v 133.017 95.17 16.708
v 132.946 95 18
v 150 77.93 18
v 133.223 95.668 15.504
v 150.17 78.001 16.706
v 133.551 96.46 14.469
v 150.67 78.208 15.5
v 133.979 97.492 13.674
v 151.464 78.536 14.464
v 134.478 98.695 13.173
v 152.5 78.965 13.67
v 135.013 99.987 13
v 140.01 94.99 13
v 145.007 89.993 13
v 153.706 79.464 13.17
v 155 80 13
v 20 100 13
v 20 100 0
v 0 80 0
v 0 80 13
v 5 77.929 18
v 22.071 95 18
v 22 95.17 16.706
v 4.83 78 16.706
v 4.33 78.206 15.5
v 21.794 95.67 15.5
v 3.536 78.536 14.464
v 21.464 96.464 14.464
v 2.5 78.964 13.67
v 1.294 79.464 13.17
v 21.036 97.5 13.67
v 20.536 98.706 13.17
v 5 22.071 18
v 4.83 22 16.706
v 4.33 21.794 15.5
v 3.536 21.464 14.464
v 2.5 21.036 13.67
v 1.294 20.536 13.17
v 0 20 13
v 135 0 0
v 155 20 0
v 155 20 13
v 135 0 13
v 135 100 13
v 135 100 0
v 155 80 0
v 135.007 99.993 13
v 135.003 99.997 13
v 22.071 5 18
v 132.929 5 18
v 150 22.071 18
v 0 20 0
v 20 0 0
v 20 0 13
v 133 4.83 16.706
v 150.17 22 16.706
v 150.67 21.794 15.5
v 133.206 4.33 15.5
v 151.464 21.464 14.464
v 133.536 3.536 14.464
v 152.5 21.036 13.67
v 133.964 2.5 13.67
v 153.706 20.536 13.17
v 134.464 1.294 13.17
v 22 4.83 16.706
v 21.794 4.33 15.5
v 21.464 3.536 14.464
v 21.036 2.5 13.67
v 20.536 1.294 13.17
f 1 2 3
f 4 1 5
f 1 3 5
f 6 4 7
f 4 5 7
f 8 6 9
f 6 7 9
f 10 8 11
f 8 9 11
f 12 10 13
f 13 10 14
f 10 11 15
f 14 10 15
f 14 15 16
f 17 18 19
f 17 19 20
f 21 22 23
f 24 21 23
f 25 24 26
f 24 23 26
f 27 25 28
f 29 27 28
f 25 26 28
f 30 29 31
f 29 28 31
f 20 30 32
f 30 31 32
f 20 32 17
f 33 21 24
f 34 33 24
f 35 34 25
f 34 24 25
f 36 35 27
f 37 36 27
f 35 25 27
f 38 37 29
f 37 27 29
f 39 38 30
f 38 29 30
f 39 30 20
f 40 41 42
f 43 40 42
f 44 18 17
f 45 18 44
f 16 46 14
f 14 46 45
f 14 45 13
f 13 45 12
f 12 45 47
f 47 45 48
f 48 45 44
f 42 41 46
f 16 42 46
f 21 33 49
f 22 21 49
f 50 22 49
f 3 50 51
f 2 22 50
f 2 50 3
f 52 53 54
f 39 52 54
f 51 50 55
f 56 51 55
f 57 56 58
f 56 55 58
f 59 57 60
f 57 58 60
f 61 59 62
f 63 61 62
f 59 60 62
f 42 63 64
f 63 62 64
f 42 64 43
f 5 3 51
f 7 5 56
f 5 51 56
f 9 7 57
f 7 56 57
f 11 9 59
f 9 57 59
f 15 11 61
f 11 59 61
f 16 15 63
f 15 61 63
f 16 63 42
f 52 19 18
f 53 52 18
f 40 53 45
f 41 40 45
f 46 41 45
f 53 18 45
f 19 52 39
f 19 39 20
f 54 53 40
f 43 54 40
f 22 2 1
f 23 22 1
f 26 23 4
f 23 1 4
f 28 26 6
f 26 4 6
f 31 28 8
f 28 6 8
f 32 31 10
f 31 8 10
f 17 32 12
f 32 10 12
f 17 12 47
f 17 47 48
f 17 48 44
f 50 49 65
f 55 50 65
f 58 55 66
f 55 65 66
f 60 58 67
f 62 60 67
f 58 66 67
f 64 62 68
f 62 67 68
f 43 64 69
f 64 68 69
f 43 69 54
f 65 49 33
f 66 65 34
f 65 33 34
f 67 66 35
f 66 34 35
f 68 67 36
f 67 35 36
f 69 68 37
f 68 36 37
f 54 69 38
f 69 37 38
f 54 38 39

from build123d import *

# Parameters (mm, degrees)
F0_W     = 155
F0_H     = 100
F1_DEPTH = 18
F2_SIZE  = 20
F4_R     = 5


with BuildPart() as f1:
    # F0 (on Top) → F1 (new body)
    with BuildSketch(Plane.XY):
        with Locations((77.5, 50)):
            Rectangle(F0_W, F0_H)
    extrude(amount=F1_DEPTH)

    # F2
    f2_edges = [f1.edges().sort_by_distance(p)[0] for p in [
        (155, 100, 9),
        (155, 0, 9),
        (0, 100, 9),
        (0, 0, 9),
    ]]
    chamfer(f2_edges, length=F2_SIZE)

    # F6: sweep along a path in F5
    with BuildLine(Plane.XY.offset(18)) as f6_path:
        Line((0, 80), (20, 100))
        Line((20, 100), (135.0186169147, 100))
        Line((135.0186169147, 100), (155, 80))
        Line((155, 80), (155, 20))
        Line((155, 20), (135, 0))
        Line((135, 0), (20, 0))
        Line((20, 0), (0, 20))
        Line((0, 20), (0, 25))
        Line((0, 25), (0, 80))
    # F4 (on offset) → F6 (sweep, cut)
    with BuildSketch(Plane.XZ.offset(-25)):
        with Locations((0, 18)):
            Circle(F4_R)
    sweep(path=f6_path.line, transition=Transition.RIGHT, mode=Mode.SUBTRACT)


solid = f1.part
